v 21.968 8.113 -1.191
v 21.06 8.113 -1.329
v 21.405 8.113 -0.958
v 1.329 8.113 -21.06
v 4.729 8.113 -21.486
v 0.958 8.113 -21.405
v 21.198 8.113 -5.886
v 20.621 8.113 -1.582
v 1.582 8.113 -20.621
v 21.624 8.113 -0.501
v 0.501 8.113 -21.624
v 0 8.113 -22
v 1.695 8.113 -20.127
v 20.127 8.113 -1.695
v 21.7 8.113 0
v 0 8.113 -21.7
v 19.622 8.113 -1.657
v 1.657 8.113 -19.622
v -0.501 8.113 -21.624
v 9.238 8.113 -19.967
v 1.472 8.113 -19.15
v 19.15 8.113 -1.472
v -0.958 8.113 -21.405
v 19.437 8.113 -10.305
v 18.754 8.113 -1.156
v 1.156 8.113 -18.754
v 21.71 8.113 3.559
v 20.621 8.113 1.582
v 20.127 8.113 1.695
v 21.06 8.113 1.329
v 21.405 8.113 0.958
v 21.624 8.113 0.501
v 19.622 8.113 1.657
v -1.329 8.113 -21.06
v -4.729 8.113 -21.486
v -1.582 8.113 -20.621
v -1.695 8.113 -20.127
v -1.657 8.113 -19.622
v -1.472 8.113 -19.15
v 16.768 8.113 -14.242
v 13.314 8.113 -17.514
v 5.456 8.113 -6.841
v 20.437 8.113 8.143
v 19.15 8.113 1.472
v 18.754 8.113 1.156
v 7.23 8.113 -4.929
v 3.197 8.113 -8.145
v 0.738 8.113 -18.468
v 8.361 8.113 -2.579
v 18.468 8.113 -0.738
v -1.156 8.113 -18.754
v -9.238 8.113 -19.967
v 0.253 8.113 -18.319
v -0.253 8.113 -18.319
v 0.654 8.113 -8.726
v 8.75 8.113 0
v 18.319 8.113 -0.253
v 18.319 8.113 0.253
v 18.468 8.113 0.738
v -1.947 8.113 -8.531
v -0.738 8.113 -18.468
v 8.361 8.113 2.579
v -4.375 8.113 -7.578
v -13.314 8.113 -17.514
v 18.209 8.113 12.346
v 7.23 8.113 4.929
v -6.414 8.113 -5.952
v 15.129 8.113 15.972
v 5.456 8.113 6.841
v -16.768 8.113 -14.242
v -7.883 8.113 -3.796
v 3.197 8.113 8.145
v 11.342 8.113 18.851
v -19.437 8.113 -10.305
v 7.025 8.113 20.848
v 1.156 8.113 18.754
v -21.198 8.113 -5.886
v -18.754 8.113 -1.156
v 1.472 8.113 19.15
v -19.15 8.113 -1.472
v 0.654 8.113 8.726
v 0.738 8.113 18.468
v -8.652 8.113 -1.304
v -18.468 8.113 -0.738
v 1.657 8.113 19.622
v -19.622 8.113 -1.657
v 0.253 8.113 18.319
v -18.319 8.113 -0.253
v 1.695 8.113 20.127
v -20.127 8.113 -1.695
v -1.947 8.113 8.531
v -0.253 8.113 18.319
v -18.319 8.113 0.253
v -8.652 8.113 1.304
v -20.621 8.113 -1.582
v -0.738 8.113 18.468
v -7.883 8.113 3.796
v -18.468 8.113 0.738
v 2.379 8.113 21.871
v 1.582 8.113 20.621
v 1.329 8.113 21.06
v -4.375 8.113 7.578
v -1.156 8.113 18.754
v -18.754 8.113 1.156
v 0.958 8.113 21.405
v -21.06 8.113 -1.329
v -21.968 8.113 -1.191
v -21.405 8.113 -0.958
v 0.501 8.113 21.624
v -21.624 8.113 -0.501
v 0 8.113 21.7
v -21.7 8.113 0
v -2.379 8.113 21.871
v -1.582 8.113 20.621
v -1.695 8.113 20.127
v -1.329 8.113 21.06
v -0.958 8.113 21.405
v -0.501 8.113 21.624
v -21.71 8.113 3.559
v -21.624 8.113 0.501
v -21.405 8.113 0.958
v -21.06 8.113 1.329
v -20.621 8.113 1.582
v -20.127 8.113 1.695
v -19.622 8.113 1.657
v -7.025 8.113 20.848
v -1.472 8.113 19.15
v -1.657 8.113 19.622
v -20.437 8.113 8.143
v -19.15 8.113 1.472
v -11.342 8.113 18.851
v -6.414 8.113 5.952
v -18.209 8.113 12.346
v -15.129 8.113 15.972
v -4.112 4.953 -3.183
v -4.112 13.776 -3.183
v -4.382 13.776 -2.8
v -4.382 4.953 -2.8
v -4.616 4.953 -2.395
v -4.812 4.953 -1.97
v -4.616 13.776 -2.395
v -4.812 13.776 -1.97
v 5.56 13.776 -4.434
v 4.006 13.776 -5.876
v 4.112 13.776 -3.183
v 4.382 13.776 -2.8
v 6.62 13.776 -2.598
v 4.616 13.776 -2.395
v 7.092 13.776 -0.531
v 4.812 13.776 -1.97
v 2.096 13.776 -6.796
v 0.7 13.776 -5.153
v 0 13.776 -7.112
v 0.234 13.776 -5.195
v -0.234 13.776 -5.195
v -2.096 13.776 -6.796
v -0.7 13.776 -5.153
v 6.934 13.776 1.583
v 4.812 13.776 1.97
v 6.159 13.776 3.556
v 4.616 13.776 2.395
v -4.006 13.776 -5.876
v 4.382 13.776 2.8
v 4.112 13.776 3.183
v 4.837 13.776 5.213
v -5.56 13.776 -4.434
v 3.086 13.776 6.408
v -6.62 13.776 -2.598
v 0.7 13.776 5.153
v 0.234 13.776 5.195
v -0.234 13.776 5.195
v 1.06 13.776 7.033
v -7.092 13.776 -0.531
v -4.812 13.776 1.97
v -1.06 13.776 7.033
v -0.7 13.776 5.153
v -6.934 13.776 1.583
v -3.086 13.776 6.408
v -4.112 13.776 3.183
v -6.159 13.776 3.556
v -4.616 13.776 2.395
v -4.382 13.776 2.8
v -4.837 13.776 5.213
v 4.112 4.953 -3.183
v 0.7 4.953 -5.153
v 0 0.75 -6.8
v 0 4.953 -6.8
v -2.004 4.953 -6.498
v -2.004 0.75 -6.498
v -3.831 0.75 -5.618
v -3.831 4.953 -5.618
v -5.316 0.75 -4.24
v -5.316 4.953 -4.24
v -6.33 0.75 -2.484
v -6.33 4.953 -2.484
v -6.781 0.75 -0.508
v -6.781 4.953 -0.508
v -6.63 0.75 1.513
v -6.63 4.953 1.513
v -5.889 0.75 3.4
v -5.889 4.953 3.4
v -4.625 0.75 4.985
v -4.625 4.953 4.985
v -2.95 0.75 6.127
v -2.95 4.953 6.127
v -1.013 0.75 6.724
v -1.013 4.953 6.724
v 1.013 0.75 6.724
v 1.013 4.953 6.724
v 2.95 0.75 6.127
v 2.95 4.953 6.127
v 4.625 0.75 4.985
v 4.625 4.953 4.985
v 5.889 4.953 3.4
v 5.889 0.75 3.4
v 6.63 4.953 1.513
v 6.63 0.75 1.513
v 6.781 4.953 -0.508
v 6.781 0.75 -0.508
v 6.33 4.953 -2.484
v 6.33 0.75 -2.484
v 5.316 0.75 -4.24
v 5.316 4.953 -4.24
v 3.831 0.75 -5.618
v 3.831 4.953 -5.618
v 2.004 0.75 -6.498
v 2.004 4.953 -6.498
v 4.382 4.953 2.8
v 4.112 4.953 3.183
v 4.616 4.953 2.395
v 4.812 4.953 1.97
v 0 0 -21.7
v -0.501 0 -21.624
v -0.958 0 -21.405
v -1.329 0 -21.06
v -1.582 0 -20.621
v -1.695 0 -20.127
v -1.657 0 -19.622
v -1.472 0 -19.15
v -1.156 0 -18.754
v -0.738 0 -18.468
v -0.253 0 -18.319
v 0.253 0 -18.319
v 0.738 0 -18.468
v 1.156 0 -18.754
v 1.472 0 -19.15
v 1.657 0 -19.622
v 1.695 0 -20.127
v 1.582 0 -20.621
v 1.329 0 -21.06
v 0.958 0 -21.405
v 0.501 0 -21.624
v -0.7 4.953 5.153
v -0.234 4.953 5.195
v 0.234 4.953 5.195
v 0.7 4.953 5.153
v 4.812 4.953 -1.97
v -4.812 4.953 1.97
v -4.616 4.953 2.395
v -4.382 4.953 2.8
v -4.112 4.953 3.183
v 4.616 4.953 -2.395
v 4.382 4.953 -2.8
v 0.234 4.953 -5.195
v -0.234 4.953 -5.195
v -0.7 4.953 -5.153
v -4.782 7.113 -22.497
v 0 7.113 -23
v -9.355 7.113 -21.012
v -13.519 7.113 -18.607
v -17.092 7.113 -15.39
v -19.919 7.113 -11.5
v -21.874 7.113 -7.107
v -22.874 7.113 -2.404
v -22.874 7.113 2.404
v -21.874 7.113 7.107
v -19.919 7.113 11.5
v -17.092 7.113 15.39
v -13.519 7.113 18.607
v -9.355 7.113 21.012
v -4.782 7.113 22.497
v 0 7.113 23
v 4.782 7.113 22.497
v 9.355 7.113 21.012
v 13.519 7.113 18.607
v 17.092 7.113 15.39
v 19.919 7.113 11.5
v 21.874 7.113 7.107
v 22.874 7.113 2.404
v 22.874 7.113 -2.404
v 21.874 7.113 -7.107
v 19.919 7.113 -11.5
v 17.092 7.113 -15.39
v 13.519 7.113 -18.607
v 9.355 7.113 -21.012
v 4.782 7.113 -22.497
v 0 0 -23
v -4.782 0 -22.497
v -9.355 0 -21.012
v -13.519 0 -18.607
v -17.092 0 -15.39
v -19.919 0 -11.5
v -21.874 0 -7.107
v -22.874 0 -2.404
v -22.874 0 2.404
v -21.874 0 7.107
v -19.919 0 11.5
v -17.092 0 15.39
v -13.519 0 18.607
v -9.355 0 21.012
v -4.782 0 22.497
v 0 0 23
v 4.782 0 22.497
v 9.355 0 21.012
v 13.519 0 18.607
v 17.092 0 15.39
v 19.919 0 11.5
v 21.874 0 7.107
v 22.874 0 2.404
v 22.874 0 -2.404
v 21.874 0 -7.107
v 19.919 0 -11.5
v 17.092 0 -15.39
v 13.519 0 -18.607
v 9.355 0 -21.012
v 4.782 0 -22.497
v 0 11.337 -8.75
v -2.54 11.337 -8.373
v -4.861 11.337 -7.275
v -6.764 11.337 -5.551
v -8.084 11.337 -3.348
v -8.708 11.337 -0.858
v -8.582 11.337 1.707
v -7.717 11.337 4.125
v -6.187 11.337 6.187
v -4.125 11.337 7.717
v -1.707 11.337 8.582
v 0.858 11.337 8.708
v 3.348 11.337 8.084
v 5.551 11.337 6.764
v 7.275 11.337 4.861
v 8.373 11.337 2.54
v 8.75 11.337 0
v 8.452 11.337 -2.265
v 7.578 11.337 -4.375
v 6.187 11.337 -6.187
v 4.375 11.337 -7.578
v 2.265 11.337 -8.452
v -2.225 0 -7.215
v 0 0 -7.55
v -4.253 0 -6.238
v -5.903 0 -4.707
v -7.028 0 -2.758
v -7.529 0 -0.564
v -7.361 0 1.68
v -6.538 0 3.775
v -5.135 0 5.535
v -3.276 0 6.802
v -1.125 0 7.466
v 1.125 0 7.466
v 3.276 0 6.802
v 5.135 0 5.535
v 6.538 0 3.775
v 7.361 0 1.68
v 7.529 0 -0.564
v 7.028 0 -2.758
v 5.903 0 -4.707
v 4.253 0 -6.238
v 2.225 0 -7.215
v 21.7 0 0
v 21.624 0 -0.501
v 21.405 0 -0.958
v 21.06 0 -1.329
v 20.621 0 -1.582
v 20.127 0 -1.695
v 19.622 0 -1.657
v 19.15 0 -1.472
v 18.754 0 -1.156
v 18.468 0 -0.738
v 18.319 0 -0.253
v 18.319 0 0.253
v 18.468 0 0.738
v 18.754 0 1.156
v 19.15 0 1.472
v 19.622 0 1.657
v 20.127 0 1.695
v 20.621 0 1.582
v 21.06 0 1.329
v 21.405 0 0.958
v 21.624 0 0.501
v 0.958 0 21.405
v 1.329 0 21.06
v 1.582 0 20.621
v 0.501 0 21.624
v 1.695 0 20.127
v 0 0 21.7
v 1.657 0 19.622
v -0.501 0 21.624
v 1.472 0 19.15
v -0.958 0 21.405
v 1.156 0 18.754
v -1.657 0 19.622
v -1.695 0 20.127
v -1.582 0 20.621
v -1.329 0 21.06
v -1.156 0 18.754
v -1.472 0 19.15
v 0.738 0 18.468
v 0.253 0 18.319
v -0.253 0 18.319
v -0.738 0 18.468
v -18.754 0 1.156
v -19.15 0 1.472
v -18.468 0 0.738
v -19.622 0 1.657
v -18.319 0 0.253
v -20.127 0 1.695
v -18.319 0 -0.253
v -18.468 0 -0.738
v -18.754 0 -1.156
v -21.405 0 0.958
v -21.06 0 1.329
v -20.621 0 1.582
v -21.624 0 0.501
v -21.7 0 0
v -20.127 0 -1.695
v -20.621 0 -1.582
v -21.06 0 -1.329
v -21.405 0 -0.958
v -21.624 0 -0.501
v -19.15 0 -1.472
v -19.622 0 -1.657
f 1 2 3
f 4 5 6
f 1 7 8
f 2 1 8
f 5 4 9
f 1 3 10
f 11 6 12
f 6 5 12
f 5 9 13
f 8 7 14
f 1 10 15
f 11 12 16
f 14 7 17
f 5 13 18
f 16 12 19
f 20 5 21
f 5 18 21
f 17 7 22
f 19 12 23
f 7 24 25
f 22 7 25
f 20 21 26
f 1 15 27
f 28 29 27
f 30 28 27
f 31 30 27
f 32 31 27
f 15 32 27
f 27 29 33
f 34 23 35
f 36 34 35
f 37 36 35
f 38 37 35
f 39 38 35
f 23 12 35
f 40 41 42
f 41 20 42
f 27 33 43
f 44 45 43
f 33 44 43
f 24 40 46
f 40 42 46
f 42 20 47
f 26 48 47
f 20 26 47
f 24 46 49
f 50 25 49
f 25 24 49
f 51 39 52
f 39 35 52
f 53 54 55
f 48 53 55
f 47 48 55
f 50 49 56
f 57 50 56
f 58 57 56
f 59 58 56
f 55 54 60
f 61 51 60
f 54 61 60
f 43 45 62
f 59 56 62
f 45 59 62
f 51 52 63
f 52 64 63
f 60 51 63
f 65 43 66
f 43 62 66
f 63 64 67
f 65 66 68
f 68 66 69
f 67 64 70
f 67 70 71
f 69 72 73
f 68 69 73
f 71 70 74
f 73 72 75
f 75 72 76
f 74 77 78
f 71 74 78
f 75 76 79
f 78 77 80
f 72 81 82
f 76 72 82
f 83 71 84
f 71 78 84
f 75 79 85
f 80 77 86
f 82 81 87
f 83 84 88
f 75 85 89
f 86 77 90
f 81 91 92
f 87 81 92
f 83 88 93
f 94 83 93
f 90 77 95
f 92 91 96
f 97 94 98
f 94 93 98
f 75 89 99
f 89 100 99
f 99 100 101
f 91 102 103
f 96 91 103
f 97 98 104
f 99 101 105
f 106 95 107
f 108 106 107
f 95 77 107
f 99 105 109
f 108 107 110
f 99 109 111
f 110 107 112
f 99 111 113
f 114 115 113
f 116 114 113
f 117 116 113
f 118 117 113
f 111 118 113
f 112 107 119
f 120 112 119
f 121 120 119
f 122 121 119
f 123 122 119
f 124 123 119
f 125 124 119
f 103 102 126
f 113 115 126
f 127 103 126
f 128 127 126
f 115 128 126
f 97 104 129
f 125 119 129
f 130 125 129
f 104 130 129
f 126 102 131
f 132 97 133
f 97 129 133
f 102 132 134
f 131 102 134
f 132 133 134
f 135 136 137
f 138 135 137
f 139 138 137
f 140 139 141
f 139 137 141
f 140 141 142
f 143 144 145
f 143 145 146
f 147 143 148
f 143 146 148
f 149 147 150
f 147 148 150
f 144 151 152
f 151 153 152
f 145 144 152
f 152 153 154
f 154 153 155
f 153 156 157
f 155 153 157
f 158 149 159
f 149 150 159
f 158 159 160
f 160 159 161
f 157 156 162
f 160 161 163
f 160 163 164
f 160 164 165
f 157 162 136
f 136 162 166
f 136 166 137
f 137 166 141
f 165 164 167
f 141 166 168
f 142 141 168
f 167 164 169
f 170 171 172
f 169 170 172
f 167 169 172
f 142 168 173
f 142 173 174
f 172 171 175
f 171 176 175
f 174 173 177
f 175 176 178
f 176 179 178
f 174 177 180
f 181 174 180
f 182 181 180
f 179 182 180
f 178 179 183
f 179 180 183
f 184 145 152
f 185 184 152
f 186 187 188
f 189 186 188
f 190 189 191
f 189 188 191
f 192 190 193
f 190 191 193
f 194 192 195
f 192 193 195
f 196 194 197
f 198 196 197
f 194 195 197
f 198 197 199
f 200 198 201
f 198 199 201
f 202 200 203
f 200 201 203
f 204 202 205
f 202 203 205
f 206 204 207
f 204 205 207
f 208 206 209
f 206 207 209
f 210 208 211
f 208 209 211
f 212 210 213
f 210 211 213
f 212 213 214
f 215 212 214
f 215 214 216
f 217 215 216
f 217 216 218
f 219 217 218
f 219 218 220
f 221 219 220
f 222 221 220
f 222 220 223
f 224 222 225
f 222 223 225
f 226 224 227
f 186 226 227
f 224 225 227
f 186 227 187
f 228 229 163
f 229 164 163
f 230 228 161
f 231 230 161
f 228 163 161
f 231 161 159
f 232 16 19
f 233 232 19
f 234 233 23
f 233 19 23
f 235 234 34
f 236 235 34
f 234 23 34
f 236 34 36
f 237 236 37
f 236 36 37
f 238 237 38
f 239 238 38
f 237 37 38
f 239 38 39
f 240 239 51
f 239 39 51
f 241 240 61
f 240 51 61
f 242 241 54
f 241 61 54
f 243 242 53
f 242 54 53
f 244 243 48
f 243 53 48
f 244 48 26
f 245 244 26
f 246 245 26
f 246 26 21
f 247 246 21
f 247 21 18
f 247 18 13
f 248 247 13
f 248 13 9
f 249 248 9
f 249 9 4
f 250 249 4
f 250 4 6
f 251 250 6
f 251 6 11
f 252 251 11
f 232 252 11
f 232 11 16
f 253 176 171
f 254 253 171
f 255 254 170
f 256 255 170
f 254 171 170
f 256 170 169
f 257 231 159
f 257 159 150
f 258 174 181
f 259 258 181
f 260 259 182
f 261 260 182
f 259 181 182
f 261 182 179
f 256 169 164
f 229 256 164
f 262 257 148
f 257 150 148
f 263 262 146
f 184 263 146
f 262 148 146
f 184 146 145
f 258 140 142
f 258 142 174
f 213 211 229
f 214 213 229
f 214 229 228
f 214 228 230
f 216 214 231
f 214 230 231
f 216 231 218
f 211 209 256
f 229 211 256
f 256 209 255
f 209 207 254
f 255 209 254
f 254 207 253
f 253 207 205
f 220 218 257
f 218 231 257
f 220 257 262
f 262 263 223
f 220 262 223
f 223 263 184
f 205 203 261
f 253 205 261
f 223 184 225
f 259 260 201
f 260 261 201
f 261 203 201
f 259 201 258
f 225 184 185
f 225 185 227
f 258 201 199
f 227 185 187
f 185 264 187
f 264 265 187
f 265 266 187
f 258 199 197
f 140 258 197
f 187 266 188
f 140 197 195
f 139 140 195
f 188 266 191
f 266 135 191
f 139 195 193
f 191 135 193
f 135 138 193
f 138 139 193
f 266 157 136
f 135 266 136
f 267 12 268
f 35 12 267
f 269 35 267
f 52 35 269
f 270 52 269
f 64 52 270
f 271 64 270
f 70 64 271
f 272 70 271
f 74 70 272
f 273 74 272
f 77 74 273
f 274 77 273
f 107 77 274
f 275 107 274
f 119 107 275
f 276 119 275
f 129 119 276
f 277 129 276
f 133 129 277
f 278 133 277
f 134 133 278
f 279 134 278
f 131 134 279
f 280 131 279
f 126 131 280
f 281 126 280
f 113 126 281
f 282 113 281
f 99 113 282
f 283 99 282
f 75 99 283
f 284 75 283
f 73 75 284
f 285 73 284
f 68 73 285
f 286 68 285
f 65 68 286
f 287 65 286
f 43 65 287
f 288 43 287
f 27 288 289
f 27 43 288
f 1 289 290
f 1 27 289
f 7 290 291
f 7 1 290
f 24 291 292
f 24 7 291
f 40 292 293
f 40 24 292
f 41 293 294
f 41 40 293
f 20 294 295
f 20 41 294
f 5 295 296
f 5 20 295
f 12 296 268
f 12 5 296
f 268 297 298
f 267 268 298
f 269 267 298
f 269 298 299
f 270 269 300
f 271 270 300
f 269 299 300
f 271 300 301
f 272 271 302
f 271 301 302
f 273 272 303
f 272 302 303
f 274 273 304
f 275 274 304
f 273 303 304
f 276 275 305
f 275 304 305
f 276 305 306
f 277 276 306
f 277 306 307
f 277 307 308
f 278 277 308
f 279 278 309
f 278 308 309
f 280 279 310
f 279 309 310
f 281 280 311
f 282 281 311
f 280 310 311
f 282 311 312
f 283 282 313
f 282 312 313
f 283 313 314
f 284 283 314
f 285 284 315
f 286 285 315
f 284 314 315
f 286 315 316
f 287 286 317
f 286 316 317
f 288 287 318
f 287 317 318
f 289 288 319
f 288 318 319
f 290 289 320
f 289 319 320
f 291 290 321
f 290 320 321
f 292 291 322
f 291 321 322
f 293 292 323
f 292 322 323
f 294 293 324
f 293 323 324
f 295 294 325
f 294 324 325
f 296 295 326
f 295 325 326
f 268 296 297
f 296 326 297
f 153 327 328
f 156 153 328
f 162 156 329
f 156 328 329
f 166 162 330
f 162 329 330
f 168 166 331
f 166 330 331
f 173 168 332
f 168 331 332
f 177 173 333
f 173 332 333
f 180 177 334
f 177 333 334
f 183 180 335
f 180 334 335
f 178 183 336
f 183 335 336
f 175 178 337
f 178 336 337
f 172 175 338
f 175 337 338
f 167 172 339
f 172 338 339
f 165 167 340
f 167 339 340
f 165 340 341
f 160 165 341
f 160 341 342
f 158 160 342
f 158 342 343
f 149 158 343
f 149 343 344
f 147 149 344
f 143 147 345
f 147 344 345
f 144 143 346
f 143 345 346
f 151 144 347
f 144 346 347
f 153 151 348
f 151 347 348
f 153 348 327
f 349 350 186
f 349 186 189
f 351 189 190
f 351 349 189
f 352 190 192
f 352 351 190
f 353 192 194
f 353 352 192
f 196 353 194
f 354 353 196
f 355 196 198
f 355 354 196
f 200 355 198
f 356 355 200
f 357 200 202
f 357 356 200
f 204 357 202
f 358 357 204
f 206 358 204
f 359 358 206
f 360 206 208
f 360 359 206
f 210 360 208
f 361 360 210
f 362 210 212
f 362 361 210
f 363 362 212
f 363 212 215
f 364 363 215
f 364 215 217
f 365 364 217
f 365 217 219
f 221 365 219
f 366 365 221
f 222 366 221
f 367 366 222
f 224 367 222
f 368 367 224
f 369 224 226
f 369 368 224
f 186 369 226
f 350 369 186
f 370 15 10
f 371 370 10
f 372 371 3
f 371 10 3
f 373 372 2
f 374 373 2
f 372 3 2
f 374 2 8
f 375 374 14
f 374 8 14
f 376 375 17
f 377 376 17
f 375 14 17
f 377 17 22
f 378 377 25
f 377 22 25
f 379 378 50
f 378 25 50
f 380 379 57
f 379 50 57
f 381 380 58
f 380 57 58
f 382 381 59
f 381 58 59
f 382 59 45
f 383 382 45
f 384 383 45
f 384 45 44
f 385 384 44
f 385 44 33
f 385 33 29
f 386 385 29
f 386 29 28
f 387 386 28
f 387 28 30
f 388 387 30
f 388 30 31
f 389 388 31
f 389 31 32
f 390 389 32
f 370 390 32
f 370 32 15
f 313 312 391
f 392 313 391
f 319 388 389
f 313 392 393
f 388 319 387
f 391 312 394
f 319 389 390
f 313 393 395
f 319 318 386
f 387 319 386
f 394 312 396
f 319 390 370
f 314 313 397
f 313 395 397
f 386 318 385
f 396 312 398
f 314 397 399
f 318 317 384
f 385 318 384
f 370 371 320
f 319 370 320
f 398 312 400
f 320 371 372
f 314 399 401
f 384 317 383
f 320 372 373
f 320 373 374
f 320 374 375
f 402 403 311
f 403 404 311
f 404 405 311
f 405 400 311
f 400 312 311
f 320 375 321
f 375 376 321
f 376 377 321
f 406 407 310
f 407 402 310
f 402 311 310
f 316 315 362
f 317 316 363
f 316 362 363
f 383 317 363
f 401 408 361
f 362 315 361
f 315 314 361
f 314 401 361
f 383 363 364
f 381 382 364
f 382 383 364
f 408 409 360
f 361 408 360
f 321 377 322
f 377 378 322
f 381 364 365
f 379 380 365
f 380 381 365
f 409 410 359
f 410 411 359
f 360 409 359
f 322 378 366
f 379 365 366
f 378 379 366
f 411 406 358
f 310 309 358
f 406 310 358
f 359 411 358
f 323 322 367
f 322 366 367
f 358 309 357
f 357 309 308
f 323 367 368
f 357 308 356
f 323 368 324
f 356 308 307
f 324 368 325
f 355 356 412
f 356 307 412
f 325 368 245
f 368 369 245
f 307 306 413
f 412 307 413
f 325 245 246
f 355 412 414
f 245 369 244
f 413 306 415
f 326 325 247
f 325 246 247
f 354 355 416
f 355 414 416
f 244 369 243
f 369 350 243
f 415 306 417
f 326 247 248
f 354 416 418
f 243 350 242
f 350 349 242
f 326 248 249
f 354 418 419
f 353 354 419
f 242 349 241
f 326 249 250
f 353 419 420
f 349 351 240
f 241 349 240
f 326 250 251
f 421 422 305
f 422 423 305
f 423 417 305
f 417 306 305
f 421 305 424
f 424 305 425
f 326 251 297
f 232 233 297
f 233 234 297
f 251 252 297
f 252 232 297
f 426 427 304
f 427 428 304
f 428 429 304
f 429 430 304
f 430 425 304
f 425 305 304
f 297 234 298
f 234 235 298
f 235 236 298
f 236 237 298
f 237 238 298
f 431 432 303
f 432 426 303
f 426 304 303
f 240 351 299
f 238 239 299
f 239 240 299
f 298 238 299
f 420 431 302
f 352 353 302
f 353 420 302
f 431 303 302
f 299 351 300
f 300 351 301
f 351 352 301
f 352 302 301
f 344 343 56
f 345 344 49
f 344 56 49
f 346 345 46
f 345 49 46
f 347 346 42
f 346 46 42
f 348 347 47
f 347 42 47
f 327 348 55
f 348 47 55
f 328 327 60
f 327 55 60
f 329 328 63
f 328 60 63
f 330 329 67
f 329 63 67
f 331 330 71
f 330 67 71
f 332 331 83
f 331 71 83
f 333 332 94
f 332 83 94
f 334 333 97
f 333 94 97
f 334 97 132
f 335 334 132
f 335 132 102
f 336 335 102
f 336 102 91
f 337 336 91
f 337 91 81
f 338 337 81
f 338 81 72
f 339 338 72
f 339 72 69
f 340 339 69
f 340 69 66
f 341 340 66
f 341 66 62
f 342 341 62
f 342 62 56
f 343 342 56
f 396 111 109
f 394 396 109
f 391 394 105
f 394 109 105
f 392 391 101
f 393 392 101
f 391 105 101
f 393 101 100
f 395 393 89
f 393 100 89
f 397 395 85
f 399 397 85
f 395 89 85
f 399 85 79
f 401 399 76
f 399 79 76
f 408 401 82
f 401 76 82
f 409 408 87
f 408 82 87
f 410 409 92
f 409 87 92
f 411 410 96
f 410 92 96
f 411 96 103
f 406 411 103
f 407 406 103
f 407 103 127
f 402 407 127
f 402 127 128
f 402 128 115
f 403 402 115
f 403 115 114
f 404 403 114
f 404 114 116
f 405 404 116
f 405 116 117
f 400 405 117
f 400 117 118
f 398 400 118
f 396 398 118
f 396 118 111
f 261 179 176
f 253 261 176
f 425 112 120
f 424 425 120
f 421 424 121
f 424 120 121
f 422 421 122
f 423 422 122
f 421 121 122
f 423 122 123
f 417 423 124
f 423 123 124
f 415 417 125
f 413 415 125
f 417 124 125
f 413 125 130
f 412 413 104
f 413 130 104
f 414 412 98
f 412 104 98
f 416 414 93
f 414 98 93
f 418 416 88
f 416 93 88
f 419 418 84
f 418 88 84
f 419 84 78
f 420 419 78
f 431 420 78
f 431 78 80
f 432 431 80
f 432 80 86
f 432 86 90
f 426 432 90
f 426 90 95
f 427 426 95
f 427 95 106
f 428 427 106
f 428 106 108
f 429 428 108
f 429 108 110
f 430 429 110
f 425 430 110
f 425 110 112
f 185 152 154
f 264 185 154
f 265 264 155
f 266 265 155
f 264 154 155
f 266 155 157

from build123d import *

# Parameters (mm, degrees)
M3_CLEARANCE_HOLE1_D   = 3.4
CIRPATTERN1_COUNT      = 4
BOSS_EXTRUDE1_START    = -8.82278
BOSS_EXTRUDE1_DEPTH    = 8.82278
CHAMFER1_SIZE          = 0.75
CHAMFER2_SIZE          = 1
MOVE_START             = 8.11328
MOVE_FACE1_OUTLINE_R   = 8.9
MOVE_FACE1_OUTLINE_R_2 = 8.75
MOVE_FACE1_DEPTH       = 3.223364194


# Read off the part's stored shape, not the designer's step: Move Face1
with BuildPart() as part:
    # Sketch1 → Revolve1 (revolve)
    with BuildSketch(Plane.XY, mode=Mode.PRIVATE) as revolve1_sk:
        Polygon((6.8, 0), (6.8, 4.953), (5.2, 4.953), (5.2, 13.77578), (7.112, 13.77578), (8.9, 11.11328), (8.9, 8.11328), (23, 8.11328), (23, 0), align=None)
    revolve(revolve1_sk.sketch.rotate(Axis((0, 0, 0), (0, 1, 0)), 90), axis=Axis((0, 0, 0), (0, 1, 0)))

    # M3 Clearance Hole1 (through all)
    with Locations(Plane.XZ):
        with Locations((-20, 0)):
            m3_clearance_hole1 = Hole(M3_CLEARANCE_HOLE1_D / 2)

    # CirPattern1: M3 Clearance Hole1 ×4 about axis
    cirpattern1_axis = Axis((0, 0, 0), (0, 1, 0))
    for i in range(1, CIRPATTERN1_COUNT):
        add(m3_clearance_hole1.rotate(cirpattern1_axis, i * 360 / CIRPATTERN1_COUNT), mode=Mode.SUBTRACT)

    # Sketch4 → Boss-Extrude1 (add)
    with BuildSketch(Plane.XZ.offset(-4.953).offset(BOSS_EXTRUDE1_START)):
        with BuildLine():
            Line((0.700412138, 5.152613205), (4.112087862, 3.182881307))
            ThreePointArc((4.112087862, 3.182881307), (2.6, 4.5033321), (0.700412138, 5.152613205))
        make_face()
        with BuildLine():
            ThreePointArc((4.8125, -1.969731898), (5.2, 0), (4.8125, 1.969731898))
            Line((4.8125, 1.969731898), (4.8125, -1.969731898))
        make_face()
        with BuildLine():
            Line((-4.112087862, 3.182881307), (-0.700412138, 5.152613205))
            ThreePointArc((-0.700412138, 5.152613205), (-2.6, 4.5033321), (-4.112087862, 3.182881307))
        make_face()
        with BuildLine():
            ThreePointArc((0.700412138, -5.152613205), (2.6, -4.5033321), (4.112087862, -3.182881307))
            Line((4.112087862, -3.182881307), (0.700412138, -5.152613205))
        make_face()
        with BuildLine():
            Line((-4.8125, -1.969731898), (-4.8125, 1.969731898))
            ThreePointArc((-4.8125, 1.969731898), (-5.2, 0), (-4.8125, -1.969731898))
        make_face()
        with BuildLine():
            ThreePointArc((-4.112087862, -3.182881307), (-2.6, -4.5033321), (-0.700412138, -5.152613205))
            Line((-0.700412138, -5.152613205), (-4.112087862, -3.182881307))
        make_face()
    extrude(amount=BOSS_EXTRUDE1_DEPTH)

    # Chamfer1
    chamfer1_edges = [part.edges().sort_by_distance(p)[0] for p in [
        (0, 0, 6.8),
    ]]
    chamfer(chamfer1_edges, length=CHAMFER1_SIZE)

    # Chamfer2
    chamfer2_edges = [part.edges().sort_by_distance(p)[0] for p in [
        (0, 8.11328, 23),
    ]]
    chamfer(chamfer2_edges, length=CHAMFER2_SIZE)

    # Move Face1 outline → Move Face1 (cut)
    with BuildSketch(Plane(origin=(0, 0, 0), x_dir=(1, 0, 0), z_dir=(0, 1, 0)).offset(MOVE_START)):
        Circle(MOVE_FACE1_OUTLINE_R)
        Circle(MOVE_FACE1_OUTLINE_R_2, mode=Mode.SUBTRACT)
    extrude(amount=MOVE_FACE1_DEPTH, mode=Mode.SUBTRACT)


solid = part.part
